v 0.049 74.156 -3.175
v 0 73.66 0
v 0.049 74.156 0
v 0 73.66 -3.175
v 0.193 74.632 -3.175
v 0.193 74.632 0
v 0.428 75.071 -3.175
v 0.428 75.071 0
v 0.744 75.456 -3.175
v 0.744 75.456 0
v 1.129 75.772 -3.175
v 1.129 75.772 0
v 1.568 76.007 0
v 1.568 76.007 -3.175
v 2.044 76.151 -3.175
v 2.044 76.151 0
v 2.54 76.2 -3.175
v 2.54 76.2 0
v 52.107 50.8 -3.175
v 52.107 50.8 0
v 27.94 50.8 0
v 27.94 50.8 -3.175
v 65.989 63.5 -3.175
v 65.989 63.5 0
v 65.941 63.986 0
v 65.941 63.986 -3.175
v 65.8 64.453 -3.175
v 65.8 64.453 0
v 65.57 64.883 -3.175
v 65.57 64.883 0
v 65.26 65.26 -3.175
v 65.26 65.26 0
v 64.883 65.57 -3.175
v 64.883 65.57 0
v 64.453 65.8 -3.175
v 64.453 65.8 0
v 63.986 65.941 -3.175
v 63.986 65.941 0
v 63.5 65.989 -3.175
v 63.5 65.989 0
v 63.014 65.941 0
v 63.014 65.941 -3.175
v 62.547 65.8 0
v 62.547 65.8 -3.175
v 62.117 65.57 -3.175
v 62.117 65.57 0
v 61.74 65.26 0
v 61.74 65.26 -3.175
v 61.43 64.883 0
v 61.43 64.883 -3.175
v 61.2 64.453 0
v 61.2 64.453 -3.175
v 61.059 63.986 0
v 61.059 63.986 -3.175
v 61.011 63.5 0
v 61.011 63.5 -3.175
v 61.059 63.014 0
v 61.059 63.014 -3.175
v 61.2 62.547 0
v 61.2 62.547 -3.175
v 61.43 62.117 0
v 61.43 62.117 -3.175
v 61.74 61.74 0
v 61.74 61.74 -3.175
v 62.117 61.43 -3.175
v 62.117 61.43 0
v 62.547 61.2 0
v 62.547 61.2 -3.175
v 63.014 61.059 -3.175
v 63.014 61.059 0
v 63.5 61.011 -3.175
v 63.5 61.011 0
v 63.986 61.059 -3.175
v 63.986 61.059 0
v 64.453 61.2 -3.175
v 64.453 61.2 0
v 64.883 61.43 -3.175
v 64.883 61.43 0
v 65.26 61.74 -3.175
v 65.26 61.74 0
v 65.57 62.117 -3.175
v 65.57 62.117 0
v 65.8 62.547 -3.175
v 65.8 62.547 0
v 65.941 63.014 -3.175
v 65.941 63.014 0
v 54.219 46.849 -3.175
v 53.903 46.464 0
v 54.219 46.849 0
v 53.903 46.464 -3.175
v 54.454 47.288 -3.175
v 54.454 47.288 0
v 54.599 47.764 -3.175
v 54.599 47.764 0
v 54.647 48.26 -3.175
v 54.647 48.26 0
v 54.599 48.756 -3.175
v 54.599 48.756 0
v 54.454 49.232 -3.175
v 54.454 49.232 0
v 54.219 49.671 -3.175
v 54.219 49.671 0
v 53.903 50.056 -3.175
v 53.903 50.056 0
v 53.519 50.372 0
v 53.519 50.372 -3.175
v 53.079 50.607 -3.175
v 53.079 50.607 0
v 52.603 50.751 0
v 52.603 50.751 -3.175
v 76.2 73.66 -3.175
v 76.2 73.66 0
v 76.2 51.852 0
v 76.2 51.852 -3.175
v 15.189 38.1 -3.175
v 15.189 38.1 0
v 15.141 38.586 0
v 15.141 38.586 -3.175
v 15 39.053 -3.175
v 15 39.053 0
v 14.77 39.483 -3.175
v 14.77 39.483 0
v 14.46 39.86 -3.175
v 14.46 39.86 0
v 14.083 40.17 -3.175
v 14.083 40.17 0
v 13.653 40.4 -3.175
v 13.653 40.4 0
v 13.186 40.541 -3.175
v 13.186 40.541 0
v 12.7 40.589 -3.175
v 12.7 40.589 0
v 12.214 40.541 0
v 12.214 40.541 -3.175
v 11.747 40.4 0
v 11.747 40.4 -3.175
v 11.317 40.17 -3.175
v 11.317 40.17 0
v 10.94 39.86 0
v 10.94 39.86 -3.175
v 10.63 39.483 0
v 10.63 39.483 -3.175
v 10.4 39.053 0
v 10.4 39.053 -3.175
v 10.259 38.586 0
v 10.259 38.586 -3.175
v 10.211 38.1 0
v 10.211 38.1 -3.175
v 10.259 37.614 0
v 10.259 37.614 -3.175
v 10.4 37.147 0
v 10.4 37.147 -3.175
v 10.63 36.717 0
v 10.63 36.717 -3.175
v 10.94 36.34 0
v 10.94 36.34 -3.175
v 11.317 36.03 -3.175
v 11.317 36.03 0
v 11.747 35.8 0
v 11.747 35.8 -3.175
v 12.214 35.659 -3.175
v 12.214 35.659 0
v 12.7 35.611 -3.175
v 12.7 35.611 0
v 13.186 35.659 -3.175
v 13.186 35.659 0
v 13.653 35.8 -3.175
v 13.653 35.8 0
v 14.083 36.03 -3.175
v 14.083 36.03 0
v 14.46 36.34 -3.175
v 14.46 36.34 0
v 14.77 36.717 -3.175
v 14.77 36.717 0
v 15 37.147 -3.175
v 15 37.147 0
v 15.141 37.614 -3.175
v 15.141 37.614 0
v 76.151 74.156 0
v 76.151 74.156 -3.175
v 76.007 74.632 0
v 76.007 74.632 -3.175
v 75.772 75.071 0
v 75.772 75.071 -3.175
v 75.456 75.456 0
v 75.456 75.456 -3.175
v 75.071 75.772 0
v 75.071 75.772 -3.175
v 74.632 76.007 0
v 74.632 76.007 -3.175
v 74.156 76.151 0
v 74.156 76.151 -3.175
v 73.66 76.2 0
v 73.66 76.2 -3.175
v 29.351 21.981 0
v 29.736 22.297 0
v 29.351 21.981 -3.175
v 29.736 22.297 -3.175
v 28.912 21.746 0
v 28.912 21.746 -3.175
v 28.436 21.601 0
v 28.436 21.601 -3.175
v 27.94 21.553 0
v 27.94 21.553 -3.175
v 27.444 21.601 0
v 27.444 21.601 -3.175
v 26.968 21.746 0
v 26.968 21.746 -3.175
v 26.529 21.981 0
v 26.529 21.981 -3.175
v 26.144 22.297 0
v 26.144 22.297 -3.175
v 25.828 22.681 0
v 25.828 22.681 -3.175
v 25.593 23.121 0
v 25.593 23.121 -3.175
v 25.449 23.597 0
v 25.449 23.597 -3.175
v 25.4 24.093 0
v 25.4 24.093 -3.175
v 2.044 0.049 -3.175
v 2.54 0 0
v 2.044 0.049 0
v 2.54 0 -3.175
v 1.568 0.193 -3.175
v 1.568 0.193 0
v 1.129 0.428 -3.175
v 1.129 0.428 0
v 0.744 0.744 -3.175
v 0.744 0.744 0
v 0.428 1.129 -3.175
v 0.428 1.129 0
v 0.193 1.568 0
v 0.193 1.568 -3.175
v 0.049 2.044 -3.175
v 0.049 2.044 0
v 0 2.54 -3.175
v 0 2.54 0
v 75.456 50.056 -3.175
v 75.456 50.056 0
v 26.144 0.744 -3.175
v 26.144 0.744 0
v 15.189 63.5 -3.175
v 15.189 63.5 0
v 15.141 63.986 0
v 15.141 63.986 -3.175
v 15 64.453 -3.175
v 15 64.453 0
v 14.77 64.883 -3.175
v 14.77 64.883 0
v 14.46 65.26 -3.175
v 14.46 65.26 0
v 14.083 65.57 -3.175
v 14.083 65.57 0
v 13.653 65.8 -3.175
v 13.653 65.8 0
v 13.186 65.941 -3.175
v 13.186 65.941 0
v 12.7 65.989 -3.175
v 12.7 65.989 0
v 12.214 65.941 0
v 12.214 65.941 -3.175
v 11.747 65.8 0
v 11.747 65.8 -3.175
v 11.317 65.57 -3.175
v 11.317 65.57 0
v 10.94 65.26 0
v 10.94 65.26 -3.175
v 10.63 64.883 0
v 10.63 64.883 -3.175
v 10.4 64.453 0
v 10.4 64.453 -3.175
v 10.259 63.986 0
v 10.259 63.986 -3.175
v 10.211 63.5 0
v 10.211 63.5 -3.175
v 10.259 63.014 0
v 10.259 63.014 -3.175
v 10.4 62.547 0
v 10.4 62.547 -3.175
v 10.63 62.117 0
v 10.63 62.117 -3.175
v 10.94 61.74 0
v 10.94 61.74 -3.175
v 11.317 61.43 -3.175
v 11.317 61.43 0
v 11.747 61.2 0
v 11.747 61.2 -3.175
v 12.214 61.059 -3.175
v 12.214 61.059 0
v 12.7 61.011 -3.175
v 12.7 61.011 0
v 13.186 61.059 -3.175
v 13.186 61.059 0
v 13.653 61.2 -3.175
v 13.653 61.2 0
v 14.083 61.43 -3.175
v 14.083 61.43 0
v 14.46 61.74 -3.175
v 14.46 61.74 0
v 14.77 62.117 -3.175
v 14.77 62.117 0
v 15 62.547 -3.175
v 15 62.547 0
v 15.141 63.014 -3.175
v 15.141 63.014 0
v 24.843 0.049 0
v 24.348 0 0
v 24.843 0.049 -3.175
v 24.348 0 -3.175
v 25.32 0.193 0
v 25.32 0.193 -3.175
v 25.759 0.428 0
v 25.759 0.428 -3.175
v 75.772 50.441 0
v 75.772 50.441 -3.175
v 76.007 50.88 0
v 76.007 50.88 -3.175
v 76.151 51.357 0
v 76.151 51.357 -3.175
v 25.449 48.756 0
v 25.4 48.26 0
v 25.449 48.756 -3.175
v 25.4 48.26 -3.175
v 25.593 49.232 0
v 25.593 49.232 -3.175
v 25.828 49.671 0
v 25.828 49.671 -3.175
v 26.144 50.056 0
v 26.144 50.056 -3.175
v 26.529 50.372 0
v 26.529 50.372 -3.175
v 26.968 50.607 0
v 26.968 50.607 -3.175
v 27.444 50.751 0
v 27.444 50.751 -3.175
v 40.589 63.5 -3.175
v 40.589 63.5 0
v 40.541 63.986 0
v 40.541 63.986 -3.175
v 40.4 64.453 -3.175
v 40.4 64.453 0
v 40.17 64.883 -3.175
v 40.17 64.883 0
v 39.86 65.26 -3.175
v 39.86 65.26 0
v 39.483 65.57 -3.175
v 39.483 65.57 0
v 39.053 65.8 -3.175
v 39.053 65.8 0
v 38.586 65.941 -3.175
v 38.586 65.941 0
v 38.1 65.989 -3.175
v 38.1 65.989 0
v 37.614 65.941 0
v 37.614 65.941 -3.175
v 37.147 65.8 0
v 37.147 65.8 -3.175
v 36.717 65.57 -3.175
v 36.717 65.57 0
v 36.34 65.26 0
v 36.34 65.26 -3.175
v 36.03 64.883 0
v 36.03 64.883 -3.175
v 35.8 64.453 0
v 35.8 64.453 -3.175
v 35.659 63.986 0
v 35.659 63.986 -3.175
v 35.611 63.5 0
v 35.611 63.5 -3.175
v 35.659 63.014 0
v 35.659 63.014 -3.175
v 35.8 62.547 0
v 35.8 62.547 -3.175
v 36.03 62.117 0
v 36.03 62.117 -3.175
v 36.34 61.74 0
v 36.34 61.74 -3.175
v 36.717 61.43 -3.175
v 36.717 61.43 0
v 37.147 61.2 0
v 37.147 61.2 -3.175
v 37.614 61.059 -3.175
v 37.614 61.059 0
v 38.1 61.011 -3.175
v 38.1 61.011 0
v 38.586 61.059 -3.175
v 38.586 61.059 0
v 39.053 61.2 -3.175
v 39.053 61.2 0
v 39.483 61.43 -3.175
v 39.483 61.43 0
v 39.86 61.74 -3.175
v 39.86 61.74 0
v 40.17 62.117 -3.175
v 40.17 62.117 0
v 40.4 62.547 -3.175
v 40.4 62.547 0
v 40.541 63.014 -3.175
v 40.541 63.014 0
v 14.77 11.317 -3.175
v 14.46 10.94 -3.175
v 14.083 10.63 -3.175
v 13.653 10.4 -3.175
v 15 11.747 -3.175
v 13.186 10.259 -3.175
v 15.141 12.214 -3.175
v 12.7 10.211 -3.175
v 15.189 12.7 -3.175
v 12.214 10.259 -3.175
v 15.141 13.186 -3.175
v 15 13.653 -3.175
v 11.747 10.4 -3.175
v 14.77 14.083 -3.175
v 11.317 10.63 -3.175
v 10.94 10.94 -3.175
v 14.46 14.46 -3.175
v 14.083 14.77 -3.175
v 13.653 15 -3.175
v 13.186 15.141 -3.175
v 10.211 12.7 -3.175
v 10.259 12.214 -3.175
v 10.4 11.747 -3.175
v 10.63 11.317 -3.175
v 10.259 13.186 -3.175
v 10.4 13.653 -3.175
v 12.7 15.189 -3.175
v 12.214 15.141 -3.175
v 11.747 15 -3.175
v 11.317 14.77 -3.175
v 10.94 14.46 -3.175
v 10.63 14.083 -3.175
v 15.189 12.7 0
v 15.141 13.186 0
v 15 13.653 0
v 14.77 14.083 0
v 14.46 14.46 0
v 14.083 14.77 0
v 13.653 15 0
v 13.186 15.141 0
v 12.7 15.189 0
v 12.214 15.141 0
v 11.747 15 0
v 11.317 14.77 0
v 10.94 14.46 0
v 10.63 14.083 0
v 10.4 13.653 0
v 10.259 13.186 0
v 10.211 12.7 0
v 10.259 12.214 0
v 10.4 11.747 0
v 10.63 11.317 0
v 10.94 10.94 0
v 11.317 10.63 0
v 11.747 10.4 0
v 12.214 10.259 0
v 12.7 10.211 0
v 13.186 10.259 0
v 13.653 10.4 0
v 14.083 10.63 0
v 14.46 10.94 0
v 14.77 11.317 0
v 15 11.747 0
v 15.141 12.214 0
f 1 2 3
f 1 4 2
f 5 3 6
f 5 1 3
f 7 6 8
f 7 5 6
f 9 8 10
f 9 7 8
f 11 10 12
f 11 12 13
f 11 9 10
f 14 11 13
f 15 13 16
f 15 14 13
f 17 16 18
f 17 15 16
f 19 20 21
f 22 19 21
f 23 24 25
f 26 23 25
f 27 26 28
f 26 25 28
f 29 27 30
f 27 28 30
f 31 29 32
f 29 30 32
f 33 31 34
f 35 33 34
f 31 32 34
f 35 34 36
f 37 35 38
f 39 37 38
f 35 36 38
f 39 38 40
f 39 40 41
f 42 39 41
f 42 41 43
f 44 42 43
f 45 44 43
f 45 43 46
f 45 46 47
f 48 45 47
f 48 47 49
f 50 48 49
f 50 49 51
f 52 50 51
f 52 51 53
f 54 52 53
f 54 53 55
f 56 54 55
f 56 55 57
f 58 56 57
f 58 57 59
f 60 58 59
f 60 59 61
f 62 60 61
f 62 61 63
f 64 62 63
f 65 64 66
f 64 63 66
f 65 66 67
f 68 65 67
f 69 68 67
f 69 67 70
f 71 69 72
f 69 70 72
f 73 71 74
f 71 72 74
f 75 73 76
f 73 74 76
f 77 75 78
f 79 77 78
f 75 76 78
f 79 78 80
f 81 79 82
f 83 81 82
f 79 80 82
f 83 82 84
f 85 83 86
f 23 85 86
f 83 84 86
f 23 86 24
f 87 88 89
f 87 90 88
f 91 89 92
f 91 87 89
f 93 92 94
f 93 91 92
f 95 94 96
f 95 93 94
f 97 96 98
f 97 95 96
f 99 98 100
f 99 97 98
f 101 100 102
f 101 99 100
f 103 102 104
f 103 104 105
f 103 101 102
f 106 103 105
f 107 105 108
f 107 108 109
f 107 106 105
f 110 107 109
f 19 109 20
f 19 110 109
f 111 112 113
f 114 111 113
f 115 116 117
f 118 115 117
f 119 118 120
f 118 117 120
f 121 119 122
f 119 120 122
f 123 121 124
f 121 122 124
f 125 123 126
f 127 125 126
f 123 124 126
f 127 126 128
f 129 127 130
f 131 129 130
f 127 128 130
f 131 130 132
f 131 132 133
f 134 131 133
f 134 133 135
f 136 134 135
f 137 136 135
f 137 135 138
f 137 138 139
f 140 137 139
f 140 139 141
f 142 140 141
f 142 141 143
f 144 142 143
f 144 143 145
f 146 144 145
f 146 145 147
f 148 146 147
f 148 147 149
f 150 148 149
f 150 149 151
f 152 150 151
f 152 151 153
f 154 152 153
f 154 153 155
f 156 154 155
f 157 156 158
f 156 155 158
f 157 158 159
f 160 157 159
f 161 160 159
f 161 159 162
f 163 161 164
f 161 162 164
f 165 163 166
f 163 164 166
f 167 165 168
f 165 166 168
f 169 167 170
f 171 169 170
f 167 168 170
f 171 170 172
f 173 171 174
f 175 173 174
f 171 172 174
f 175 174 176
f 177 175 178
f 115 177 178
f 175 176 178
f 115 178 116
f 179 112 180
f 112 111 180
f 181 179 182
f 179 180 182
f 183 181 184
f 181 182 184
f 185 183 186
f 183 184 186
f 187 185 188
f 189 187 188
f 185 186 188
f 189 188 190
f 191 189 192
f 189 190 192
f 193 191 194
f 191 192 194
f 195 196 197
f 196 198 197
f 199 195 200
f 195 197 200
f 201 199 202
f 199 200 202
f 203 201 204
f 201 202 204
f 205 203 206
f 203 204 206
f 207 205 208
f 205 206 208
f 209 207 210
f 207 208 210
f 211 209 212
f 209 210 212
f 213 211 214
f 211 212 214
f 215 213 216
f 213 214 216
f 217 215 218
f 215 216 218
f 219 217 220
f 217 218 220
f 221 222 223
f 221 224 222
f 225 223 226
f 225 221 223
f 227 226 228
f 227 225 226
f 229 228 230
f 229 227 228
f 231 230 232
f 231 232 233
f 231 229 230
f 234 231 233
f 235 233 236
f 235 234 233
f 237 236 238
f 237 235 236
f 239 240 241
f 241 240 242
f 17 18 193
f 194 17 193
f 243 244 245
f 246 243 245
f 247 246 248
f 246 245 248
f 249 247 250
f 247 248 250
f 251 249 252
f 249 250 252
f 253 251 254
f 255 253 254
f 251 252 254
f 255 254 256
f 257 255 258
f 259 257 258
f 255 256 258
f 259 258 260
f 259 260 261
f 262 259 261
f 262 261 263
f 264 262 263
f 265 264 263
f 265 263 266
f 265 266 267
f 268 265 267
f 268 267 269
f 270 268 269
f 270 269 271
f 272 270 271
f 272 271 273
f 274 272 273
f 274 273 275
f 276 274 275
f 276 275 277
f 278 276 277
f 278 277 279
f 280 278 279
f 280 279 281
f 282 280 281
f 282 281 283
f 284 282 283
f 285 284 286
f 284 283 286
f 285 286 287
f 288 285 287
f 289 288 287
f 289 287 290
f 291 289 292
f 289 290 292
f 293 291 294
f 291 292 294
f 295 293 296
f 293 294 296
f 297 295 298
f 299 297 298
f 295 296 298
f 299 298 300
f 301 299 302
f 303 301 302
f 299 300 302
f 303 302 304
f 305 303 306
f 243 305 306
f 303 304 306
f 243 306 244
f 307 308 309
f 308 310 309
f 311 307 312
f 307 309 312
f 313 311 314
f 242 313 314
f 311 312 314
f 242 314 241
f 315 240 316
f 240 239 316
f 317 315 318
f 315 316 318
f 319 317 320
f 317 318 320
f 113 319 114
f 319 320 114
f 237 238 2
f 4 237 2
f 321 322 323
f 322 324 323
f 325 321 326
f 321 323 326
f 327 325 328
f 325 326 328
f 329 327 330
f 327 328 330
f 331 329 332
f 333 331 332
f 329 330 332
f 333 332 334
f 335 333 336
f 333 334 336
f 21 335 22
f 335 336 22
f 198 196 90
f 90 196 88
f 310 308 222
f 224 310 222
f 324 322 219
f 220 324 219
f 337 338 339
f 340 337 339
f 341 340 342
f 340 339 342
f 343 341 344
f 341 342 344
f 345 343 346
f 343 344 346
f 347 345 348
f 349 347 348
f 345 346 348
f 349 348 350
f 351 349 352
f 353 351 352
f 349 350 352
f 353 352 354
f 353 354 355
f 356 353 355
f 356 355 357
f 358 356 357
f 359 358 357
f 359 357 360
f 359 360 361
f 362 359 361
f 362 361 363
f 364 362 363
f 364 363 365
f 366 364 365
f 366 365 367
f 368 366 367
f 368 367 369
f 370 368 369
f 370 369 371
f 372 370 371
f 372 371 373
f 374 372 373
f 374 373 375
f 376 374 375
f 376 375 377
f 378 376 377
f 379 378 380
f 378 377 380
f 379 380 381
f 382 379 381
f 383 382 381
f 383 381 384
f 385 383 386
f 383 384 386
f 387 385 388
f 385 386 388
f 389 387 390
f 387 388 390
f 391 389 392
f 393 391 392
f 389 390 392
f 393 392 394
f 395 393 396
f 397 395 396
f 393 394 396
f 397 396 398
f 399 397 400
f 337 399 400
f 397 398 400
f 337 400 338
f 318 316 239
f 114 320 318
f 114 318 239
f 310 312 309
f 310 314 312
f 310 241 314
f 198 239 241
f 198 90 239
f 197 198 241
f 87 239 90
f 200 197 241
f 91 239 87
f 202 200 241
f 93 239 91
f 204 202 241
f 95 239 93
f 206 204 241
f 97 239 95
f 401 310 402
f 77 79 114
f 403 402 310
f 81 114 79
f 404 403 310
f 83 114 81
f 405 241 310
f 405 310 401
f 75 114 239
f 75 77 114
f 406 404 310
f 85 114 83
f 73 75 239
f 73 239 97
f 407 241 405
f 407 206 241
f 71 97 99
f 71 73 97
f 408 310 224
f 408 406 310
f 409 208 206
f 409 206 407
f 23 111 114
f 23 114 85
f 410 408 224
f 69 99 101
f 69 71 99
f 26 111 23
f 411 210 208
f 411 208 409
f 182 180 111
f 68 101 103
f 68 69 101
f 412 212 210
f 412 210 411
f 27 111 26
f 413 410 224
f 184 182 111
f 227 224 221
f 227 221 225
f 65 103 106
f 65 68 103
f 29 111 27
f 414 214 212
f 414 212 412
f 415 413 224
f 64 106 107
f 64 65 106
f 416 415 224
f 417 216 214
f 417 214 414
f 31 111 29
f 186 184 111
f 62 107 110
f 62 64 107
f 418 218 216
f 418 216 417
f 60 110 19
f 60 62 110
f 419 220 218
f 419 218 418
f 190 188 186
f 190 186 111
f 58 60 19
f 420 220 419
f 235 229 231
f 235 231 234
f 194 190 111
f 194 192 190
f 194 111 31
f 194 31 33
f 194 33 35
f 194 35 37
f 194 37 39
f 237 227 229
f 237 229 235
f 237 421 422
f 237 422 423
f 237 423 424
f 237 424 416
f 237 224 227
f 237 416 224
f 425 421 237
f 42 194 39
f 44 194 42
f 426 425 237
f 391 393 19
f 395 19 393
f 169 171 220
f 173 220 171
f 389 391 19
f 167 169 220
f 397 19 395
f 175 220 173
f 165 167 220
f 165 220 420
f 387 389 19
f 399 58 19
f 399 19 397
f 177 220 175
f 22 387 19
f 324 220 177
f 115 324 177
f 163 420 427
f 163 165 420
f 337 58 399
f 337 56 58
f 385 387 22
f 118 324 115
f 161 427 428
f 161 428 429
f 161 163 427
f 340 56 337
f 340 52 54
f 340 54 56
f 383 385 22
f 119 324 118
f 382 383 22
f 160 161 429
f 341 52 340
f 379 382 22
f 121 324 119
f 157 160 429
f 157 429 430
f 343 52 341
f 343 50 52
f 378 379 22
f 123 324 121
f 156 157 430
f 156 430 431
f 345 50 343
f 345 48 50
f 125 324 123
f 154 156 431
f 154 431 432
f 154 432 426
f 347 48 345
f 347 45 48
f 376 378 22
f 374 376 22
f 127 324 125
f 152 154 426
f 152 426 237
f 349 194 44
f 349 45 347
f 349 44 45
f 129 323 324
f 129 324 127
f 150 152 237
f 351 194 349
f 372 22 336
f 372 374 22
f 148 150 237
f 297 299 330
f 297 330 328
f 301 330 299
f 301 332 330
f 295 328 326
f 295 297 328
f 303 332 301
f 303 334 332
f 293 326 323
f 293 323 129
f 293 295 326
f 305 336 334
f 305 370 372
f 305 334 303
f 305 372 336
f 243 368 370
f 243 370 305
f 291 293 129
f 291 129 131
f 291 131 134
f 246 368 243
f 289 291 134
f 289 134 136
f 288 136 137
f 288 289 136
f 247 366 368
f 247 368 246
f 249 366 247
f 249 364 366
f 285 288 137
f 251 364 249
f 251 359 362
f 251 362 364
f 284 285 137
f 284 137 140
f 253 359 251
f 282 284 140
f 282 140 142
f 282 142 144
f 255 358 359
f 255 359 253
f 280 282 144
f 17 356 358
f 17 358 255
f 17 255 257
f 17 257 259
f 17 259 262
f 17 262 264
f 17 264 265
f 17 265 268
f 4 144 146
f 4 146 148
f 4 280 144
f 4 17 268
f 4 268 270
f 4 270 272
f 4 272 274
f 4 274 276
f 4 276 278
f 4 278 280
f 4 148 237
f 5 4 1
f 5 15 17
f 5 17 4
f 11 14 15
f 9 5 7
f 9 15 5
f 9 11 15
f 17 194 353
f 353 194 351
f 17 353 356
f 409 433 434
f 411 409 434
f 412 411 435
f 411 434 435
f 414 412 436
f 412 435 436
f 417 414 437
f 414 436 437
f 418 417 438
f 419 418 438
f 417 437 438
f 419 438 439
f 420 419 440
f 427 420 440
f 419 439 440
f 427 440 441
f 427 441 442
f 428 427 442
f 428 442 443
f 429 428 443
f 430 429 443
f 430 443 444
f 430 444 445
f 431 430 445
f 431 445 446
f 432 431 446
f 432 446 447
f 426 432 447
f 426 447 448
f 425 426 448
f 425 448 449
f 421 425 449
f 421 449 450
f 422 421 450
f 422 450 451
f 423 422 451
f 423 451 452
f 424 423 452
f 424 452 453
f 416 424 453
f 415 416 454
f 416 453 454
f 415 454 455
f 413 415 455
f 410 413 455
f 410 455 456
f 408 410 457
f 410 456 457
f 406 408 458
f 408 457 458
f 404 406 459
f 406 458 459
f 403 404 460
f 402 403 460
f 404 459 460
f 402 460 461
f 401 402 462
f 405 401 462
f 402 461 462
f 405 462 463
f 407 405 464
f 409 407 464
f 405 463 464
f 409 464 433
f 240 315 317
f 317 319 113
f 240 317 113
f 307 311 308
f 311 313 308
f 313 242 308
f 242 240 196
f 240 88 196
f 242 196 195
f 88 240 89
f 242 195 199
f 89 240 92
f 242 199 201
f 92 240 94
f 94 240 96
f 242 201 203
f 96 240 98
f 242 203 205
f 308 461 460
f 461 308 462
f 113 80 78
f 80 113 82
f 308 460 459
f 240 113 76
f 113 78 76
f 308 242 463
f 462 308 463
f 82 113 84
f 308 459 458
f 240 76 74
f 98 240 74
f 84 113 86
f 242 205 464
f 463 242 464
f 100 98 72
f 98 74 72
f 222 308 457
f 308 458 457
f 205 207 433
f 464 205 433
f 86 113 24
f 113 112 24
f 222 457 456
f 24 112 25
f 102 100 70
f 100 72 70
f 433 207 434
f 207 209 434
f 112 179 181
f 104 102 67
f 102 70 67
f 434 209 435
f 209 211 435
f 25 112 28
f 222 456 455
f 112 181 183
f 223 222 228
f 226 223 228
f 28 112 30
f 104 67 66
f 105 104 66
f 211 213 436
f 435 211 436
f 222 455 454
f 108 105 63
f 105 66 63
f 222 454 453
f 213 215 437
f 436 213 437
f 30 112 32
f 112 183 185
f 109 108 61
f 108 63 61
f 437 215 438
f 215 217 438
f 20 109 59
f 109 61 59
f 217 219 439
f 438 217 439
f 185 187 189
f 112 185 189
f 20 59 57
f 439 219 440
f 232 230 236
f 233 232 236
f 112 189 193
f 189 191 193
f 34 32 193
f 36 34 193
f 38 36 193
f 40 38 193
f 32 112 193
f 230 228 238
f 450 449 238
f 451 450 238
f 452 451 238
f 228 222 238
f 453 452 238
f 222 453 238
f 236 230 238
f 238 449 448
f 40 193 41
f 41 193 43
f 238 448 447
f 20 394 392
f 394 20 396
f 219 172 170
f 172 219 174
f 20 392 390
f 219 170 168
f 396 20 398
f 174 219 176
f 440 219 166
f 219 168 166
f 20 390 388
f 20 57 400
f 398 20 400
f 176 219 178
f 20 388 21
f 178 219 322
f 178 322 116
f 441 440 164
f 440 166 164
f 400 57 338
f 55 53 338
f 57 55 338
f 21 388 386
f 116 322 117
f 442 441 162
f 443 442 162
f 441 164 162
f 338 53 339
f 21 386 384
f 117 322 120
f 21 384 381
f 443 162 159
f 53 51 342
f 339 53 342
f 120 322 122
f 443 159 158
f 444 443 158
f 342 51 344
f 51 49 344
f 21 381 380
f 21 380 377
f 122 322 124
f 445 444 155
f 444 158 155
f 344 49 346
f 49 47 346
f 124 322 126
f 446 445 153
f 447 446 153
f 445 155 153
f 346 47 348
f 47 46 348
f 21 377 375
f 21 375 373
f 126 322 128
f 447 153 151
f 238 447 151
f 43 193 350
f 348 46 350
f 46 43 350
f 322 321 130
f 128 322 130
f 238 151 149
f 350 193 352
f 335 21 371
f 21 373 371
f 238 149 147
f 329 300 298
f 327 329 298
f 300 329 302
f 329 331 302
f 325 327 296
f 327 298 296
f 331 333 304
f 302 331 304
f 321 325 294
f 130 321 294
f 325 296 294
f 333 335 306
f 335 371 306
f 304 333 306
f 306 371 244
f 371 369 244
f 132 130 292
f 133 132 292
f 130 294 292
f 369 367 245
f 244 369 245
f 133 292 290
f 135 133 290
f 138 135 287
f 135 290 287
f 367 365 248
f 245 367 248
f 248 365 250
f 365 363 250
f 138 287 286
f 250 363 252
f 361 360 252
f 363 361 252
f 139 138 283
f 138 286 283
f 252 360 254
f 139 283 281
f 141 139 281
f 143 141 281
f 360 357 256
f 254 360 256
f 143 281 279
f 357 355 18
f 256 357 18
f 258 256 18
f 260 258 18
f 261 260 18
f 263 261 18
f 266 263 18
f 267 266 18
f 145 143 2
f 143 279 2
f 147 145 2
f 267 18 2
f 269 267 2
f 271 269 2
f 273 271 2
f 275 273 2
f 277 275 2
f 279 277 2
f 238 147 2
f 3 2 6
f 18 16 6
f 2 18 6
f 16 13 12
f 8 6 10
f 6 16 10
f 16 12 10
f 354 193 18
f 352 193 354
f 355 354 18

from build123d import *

# Parameters (mm, degrees)
BOSS_EXTRUDE1_DEPTH = 3.175
SKETCH2_R           = 2.4892
CUT_EXTRUDE1_DEPTH  = 108.809835474
FILLET3_R           = 2.54


with BuildPart() as part:
    # Sketch1 → Boss-Extrude1 (new body)
    with BuildSketch(Plane.XY):
        Polygon((25.4, 0), (0, 0), (0, 76.2), (76.2, 76.2), (76.2, 50.8), align=None)
        Polygon((58.239487758, 50.8), (25.4, 50.8), (25.4, 17.960512242), align=None, mode=Mode.SUBTRACT)
    extrude(amount=-BOSS_EXTRUDE1_DEPTH)

    # Sketch2 → Cut-Extrude1 (cut, through all)
    with BuildSketch(Plane.XY):
        with Locations((12.7, 63.5)):
            Circle(SKETCH2_R)
        with Locations((38.1, 63.5)):
            Circle(SKETCH2_R)
        with Locations((63.5, 63.5)):
            Circle(SKETCH2_R)
        with Locations((12.7, 38.1)):
            Circle(SKETCH2_R)
        with Locations((12.7, 12.7)):
            Circle(SKETCH2_R)
    extrude(amount=-CUT_EXTRUDE1_DEPTH, mode=Mode.SUBTRACT)

    # Fillet3
    fillet3_edges = [part.edges().sort_by_distance(p)[0] for p in [
        (25.4, 50.8, -1.5875),
        (25.4, 17.960512242, -1.5875),
        (58.239487758, 50.8, -1.5875),
        (0, 0, -1.5875),
        (0, 76.2, -1.5875),
        (76.2, 76.2, -1.5875),
        (76.2, 50.8, -1.5875),
        (25.4, 0, -1.5875),
    ]]
    fillet(fillet3_edges, radius=FILLET3_R)


solid = part.part
